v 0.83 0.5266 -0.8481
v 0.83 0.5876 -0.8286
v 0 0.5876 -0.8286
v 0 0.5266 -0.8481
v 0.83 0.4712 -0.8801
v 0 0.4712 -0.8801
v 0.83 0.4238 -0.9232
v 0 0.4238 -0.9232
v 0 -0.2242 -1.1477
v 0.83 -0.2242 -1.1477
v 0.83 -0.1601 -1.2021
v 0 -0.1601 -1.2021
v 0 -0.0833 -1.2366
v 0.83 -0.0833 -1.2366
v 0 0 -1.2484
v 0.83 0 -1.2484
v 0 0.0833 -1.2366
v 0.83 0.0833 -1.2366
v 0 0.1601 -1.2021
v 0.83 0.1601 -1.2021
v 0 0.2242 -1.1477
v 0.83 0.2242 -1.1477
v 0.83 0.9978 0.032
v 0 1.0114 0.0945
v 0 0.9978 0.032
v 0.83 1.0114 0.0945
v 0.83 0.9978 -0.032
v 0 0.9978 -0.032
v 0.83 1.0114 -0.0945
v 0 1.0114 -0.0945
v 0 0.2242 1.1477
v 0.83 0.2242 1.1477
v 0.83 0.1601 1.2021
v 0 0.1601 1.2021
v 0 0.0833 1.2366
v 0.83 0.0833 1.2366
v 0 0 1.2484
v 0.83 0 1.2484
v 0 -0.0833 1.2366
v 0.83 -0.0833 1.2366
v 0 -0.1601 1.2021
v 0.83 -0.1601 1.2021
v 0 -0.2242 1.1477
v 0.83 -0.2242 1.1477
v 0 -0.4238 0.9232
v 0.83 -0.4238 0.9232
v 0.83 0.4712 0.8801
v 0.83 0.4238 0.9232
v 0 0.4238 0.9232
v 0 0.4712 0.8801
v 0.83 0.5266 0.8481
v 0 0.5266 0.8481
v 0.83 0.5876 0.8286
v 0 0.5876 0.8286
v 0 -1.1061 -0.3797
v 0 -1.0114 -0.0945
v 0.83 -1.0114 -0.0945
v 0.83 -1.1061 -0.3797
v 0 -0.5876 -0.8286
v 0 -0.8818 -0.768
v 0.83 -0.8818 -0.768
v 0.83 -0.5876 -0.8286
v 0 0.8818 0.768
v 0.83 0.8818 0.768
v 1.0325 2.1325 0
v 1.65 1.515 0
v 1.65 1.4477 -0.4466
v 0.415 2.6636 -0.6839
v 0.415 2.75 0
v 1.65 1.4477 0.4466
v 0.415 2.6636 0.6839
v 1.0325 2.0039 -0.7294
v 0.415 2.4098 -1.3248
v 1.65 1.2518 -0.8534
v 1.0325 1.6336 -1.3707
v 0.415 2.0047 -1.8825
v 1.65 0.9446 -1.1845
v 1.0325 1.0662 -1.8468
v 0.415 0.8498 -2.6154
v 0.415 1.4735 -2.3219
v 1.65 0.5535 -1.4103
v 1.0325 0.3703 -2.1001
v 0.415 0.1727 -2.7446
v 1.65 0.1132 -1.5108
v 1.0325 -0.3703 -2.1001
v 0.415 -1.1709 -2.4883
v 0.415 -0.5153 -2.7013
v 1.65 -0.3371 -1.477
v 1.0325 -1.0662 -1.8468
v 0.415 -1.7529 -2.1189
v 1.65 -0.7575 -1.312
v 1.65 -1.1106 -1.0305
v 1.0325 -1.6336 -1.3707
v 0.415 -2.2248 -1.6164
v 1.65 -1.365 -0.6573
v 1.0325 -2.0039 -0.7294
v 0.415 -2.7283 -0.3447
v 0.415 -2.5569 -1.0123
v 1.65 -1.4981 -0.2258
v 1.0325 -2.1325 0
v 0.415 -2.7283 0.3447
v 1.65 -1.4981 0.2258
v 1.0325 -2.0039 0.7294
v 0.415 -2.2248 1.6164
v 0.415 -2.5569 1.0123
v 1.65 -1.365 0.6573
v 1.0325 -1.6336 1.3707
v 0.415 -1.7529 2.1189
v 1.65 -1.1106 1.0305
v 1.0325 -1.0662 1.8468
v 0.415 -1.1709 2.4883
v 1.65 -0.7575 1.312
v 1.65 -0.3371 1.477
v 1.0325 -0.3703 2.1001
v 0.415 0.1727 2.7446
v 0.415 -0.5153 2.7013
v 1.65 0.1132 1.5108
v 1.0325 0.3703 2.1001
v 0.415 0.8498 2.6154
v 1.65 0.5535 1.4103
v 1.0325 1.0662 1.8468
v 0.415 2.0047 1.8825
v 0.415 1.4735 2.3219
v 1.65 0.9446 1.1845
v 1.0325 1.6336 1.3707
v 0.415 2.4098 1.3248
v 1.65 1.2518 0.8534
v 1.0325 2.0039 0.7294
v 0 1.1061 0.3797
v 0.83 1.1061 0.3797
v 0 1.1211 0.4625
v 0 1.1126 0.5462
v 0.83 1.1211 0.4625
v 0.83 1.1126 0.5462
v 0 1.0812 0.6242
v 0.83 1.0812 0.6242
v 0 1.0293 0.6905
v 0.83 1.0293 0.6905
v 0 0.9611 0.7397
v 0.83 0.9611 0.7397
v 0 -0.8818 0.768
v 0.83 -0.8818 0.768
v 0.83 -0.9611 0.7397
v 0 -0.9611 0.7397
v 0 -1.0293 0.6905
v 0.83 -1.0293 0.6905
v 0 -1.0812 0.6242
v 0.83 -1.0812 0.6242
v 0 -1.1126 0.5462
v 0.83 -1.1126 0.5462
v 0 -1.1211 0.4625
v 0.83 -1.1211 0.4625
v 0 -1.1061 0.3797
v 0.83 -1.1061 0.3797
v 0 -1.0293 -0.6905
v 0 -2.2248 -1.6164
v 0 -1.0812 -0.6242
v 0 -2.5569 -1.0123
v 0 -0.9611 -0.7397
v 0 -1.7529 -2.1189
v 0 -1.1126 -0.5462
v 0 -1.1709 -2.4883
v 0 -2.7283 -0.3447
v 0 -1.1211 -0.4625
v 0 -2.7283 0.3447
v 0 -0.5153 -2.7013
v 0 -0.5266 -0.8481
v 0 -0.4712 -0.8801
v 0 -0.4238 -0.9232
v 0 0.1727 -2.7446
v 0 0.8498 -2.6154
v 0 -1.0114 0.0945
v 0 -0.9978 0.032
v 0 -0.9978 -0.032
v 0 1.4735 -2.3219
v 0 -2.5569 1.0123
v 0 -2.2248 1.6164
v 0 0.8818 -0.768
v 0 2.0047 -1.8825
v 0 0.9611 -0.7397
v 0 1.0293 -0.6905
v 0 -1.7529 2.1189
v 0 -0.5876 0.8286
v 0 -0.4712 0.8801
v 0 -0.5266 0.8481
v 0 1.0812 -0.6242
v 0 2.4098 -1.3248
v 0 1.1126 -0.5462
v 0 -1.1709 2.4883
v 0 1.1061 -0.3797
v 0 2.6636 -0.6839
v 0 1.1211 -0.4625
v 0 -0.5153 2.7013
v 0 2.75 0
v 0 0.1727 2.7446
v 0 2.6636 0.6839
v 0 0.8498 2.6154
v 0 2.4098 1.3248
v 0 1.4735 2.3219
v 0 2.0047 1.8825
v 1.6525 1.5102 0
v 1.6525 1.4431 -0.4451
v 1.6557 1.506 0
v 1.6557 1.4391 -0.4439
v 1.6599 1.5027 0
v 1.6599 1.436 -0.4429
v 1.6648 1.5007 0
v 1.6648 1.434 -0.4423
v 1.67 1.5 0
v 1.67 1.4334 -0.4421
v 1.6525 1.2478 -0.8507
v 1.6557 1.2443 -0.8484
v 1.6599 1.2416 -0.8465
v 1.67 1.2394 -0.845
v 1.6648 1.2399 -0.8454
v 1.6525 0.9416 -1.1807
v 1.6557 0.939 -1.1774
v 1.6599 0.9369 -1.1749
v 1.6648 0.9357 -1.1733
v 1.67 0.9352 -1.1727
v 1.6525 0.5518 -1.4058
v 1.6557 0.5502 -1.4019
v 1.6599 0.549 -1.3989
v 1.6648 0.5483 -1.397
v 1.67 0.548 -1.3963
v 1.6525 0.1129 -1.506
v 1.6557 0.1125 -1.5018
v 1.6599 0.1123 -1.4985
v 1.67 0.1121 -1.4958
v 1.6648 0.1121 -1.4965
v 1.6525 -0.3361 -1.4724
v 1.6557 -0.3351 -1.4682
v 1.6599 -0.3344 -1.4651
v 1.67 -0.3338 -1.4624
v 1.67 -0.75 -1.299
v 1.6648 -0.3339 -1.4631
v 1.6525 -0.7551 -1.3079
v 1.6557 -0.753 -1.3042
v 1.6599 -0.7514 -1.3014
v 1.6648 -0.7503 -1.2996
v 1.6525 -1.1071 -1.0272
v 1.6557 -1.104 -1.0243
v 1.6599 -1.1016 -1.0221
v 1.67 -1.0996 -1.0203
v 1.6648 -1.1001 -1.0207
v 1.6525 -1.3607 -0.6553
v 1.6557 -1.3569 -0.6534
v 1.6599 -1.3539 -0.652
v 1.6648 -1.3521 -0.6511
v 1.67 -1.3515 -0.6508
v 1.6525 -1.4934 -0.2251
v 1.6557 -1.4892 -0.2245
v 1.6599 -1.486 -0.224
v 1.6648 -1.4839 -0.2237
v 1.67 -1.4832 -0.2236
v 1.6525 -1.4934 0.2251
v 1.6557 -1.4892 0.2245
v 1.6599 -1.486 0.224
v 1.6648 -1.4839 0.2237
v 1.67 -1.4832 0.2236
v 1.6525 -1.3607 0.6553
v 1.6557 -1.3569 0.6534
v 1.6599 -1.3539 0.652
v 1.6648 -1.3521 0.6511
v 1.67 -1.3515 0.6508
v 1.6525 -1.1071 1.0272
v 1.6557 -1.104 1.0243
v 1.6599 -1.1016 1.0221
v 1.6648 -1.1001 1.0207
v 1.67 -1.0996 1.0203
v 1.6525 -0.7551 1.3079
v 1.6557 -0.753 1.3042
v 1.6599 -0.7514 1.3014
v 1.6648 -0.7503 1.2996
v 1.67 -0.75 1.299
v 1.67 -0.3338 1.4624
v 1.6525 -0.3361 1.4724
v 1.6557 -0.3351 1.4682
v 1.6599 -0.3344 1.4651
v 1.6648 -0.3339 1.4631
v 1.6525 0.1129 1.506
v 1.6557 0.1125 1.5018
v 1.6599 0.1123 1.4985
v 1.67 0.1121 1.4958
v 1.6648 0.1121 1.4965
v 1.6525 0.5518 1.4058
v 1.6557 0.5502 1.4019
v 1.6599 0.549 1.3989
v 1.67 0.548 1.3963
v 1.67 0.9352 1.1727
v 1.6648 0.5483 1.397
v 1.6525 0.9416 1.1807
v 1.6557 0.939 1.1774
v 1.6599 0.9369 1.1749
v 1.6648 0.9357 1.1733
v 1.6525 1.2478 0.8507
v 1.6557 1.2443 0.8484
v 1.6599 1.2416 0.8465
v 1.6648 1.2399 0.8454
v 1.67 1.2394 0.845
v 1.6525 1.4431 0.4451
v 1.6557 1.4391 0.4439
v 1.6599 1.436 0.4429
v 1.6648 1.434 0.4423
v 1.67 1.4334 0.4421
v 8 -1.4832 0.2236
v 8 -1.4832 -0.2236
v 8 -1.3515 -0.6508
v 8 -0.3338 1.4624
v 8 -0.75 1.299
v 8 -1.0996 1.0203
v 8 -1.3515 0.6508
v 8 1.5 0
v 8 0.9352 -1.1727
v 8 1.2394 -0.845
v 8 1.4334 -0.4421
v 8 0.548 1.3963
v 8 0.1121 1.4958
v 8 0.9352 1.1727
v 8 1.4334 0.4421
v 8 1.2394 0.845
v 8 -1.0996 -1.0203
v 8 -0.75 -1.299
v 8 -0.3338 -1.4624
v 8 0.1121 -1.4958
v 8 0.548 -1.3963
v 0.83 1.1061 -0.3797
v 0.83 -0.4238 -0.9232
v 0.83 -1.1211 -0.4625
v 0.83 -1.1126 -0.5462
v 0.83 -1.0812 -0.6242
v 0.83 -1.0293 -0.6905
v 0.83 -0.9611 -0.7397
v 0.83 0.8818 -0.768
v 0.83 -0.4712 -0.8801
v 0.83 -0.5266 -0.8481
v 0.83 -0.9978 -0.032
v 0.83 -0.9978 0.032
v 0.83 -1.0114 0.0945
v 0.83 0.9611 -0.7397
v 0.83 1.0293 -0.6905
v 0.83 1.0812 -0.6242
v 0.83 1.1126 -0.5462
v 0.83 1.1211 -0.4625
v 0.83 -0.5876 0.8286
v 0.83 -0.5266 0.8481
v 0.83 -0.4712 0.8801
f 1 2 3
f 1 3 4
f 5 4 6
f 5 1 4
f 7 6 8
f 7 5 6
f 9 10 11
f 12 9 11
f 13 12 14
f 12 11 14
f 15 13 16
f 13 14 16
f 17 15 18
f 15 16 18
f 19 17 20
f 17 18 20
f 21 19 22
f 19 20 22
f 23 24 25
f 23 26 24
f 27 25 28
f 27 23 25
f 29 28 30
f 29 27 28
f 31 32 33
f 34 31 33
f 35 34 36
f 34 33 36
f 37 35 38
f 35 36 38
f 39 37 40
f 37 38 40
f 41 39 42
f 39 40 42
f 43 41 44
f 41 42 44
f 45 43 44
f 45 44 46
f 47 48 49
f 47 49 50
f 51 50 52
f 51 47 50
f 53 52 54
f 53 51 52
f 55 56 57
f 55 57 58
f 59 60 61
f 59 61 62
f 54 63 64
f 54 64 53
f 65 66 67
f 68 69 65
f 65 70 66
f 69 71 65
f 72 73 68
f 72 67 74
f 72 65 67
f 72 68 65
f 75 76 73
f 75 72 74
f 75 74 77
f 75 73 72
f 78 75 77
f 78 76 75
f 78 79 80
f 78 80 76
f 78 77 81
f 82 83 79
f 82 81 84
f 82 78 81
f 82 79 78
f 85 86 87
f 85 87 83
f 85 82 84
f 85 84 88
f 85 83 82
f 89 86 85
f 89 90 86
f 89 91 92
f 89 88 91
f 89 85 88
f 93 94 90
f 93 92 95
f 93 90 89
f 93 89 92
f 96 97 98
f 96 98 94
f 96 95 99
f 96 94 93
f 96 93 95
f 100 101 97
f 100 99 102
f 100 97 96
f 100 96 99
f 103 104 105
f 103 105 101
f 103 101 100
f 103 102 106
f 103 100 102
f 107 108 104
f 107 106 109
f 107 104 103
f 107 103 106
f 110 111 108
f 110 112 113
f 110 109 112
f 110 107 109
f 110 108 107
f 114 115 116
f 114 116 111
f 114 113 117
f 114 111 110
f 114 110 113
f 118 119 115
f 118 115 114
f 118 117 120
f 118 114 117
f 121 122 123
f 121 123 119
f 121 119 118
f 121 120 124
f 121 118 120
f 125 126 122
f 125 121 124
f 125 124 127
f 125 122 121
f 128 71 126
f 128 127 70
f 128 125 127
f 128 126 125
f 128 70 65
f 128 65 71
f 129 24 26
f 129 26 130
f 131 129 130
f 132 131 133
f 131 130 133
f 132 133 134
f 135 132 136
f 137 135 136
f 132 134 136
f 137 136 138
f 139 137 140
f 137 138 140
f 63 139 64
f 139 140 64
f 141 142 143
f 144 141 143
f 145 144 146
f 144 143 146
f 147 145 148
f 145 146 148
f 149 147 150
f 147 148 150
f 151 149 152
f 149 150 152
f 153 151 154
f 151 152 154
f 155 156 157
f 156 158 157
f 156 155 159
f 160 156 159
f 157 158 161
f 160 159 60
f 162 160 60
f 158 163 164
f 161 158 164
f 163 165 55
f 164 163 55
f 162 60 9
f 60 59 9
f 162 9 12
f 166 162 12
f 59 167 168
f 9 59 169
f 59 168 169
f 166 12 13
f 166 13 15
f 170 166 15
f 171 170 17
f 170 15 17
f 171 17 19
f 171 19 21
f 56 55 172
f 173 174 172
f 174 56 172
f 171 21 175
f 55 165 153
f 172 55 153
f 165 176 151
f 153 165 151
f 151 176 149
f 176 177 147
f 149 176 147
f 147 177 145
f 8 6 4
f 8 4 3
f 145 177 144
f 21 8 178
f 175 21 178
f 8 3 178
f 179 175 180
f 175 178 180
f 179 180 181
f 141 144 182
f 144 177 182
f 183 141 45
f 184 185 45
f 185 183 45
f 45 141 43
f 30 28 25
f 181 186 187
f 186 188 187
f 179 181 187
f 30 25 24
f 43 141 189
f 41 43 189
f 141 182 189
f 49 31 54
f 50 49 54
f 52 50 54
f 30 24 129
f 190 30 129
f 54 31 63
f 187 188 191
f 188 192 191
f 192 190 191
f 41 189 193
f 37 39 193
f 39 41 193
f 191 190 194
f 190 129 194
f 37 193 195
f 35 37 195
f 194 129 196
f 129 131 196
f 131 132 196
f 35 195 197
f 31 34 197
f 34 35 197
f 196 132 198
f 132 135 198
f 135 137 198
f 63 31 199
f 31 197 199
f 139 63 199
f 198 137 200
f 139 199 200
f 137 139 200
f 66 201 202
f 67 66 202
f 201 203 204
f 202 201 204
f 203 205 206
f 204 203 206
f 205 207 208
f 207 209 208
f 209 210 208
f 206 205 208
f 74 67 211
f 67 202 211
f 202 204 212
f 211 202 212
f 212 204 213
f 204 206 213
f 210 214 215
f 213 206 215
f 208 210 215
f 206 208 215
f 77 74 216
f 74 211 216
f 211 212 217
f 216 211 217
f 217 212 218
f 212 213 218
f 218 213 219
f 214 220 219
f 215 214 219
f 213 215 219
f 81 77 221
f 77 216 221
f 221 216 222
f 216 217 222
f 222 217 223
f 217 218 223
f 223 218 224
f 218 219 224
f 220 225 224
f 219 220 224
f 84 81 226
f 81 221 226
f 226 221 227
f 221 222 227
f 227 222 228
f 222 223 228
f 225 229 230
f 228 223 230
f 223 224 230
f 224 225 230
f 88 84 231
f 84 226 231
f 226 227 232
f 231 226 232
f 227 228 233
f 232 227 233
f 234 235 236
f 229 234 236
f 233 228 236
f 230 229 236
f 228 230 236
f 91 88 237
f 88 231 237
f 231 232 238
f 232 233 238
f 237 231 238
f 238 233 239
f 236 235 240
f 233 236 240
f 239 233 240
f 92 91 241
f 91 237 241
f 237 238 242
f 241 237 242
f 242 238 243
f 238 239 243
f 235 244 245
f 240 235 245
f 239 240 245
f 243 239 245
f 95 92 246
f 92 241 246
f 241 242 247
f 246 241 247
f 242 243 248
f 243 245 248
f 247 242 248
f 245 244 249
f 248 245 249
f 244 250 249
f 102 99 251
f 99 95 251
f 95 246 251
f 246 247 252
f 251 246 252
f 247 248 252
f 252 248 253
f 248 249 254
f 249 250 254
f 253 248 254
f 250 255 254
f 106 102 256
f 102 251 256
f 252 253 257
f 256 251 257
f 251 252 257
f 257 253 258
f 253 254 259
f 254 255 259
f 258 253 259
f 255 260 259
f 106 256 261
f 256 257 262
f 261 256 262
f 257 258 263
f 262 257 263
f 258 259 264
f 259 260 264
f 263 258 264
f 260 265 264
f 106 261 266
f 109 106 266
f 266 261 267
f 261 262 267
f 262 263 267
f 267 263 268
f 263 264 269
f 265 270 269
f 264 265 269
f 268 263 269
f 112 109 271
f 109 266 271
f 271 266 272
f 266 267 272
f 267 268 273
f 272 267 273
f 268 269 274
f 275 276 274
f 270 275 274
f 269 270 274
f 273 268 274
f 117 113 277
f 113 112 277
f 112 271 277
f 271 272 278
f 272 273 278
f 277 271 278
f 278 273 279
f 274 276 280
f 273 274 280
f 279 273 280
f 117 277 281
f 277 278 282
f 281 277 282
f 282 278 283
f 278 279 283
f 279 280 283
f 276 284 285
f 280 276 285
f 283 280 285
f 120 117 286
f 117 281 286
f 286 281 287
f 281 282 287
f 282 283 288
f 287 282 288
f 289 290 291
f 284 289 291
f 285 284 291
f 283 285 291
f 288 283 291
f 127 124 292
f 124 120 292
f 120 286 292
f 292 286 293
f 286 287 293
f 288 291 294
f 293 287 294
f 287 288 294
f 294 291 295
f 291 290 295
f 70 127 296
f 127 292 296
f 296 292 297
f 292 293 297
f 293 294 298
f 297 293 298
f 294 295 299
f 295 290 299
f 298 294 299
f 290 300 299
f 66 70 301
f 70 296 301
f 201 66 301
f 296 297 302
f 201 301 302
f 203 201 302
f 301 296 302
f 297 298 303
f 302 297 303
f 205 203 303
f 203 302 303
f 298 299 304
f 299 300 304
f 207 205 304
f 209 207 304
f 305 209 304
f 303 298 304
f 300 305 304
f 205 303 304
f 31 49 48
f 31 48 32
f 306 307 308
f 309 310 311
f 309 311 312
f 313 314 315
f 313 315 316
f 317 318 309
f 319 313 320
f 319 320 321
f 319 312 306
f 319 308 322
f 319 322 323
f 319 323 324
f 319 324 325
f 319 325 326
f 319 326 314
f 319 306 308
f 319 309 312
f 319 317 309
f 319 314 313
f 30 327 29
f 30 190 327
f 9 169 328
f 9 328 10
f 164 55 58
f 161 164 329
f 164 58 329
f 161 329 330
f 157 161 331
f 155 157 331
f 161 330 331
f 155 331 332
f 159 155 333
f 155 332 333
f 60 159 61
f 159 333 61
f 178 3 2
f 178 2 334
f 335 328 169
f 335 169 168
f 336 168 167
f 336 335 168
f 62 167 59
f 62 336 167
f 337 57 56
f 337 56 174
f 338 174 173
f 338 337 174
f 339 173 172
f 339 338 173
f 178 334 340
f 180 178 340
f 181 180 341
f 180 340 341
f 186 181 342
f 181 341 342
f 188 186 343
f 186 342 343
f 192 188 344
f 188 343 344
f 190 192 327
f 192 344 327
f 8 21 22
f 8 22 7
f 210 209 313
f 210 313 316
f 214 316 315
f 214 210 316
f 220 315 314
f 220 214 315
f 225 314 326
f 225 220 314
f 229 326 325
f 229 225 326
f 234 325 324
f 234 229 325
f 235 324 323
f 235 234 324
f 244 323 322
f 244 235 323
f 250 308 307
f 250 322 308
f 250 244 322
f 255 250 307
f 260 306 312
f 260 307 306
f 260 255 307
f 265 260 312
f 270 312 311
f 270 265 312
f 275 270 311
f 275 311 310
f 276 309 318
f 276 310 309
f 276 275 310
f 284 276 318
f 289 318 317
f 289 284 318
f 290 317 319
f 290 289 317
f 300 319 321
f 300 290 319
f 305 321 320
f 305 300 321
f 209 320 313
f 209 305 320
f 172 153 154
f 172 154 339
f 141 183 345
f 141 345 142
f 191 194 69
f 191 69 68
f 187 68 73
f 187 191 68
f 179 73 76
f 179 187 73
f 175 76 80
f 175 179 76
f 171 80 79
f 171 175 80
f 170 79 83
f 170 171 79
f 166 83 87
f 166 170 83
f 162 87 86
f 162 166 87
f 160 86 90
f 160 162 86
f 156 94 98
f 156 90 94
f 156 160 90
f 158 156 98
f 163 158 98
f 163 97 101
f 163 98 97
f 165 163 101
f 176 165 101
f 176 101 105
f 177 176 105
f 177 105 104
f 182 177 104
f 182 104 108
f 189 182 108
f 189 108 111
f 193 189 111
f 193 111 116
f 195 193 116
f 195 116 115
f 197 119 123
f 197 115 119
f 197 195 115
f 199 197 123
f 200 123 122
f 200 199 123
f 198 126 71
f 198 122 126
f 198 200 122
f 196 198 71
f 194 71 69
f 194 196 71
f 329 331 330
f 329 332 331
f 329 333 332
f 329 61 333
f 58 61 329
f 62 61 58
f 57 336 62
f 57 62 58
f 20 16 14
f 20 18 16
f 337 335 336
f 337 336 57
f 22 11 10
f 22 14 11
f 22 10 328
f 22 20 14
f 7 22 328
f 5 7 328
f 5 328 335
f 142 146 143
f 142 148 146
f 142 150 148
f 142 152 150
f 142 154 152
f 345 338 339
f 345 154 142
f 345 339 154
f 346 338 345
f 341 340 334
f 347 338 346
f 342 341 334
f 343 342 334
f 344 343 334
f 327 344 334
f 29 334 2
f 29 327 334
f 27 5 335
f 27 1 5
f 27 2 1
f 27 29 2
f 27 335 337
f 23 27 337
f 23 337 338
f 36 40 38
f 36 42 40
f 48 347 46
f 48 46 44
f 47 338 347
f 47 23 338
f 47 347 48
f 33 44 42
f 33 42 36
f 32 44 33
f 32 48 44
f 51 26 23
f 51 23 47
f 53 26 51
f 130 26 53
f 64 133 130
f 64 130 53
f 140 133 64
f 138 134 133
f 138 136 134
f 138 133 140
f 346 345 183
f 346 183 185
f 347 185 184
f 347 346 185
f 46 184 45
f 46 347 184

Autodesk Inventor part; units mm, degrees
ref_plane "YZ Plane" through (0, 0, 0) normal (1, 0, 0) x (0, 1, 0)
ref_plane "XZ Plane" through (0, 0, 0) normal (0, 1, 0) x (-1, 0, 0)
ref_plane "XY Plane" through (0, 0, 0) normal (0, 0, 1) x (1, 0, 0)
sketch "Sketch1" plane through (0, 0, 0) normal (0, 0, 1) x (1, 0, 0)
  line L0 (0, 0) -> (8, 0)
  line L1 (8, 0) -> (8, 1.5)
  line L2 (8, 1.5) -> (2.35, 1.5)
  line L3 (2.35, 1.5) -> (2.15, 1.5)
  line L4 (2.15, 1.5) -> (1.67, 1.5)
  line L5 (1.65, 1.515) -> (1.65, 1.515)
  line L6 (1.65, 1.515) -> (0.415, 2.75)
  line L7 (0.415, 2.75) -> (0, 2.75)
  line L8 (0, 2.75) -> (0, 0)
  line L9 (1.65, 1.515) -> (1.65, 1.52)
  arc A0 (1.65, 1.52) -> (1.67, 1.5) centre (1.67, 1.52) ccw
  dimension "d17" = 8
  dimension "d18" = 0.415
  dimension "d19" = 1.65
  dimension "d20" = 0
  dimension "d21" = 5.5
  dimension "d22" = 3
  dimension "d23" = 3
  dimension "d25" = 45
  dimension "d26" = 0.2
  dimension "d28" = 0.02
  dimension "d29" = 5.65
  dimension "d30" = 0.02
  dimension "d52" = 0.7
revolve "Revolution1" add sketch "Sketch1" angle 360 about axis through (0, 0, 0) along (1, 0, 0)
thread "Thread1" size "M3x0.5" class "6g" standard "ISO Metric profile" length 5.65
sketch "Sketch2" plane through (0, 0, 0) normal (-1, 0, 0) x (0, 0, 1)
  circle A0 centre (0, 0) radius 1.4 construction
  circle A1 centre (0, 0) radius 0.98 construction
  line L0 (0, 0) -> (0.8487, 0.49)
  line L1 (0, 0) -> (0.98, 0) construction
  line L2 (0, 0) -> (0.8487, -0.49)
  line L3 (0, 0) -> (0.98, 0) construction
  line L4 (0.8487, 0.49) -> (1.4, 0)
  line L5 (1.4, 0) -> (0.8487, -0.49)
  dimension "d34" = 2.8
  dimension "d35" = 1.96
  dimension "d39" = 30
  dimension "d40" = 330
extrude "Extrusion1" cut sketch "Sketch2" against normal blind 0.83
pattern_circular "Circular Pattern1" count 6 over 360 about axis through (-10, 0, 0) along (1, 0, 0) of "Extrusion1"
fillet "Fillet1" radius 0.3 12 edges at (0.415, 0.49, 0.8487) (0.415, 0, 1.4) (0.415, -0.49, 0.8487) (0.415, -0.98, 0) (0.415, -1.2124, 0.7) (0.415, -1.2124, -0.7) (0.415, -0.49, -0.8487) (0.415, 0, -1.4) (0.415, 0.49, -0.8487) (0.415, 1.2124, -0.7) (0.415, 0.98, 0) (0.415, 1.2124, 0.7)
equation "\"d32\" = b"
equation "\"d34\" = A_"
equation "\"d35\" = 0.7 * A_"
equation "\"d43\" = t"
equation "\"d48\" = v"
equation "\"d17\" = l_"
equation "\"d18\" = 0.5 * t"
equation "\"d19\" = k"
equation "\"d21\" = dk"
equation "\"d22\" = d"
equation "\"d23\" = ds_"
equation "\"d25\" = 0.5 * headAngle"
equation "\"d26\" = x"
equation "\"d28\" = r"
equation "\"d29\" = b"
equation "\"b\" = 5.65"
equation "\"A_\" = 2.8"
equation "\"t\" = 0.83"
equation "\"v\" = 0.3"
equation "\"l_\" = 8"
equation "\"k\" = 1.65"
equation "\"dk\" = 5.5"
equation "\"d\" = 3"
equation "\"ds_\" = 3"
equation "\"headAngle\" = 90deg"
equation "\"x\" = 0.2"
equation "\"r\" = 0.02"
properties part number "Šroub se zápustnou hlavou a šestiramennou drážkou ISO 14581 - M3x8-4.8" material "Ocel, měkká"
